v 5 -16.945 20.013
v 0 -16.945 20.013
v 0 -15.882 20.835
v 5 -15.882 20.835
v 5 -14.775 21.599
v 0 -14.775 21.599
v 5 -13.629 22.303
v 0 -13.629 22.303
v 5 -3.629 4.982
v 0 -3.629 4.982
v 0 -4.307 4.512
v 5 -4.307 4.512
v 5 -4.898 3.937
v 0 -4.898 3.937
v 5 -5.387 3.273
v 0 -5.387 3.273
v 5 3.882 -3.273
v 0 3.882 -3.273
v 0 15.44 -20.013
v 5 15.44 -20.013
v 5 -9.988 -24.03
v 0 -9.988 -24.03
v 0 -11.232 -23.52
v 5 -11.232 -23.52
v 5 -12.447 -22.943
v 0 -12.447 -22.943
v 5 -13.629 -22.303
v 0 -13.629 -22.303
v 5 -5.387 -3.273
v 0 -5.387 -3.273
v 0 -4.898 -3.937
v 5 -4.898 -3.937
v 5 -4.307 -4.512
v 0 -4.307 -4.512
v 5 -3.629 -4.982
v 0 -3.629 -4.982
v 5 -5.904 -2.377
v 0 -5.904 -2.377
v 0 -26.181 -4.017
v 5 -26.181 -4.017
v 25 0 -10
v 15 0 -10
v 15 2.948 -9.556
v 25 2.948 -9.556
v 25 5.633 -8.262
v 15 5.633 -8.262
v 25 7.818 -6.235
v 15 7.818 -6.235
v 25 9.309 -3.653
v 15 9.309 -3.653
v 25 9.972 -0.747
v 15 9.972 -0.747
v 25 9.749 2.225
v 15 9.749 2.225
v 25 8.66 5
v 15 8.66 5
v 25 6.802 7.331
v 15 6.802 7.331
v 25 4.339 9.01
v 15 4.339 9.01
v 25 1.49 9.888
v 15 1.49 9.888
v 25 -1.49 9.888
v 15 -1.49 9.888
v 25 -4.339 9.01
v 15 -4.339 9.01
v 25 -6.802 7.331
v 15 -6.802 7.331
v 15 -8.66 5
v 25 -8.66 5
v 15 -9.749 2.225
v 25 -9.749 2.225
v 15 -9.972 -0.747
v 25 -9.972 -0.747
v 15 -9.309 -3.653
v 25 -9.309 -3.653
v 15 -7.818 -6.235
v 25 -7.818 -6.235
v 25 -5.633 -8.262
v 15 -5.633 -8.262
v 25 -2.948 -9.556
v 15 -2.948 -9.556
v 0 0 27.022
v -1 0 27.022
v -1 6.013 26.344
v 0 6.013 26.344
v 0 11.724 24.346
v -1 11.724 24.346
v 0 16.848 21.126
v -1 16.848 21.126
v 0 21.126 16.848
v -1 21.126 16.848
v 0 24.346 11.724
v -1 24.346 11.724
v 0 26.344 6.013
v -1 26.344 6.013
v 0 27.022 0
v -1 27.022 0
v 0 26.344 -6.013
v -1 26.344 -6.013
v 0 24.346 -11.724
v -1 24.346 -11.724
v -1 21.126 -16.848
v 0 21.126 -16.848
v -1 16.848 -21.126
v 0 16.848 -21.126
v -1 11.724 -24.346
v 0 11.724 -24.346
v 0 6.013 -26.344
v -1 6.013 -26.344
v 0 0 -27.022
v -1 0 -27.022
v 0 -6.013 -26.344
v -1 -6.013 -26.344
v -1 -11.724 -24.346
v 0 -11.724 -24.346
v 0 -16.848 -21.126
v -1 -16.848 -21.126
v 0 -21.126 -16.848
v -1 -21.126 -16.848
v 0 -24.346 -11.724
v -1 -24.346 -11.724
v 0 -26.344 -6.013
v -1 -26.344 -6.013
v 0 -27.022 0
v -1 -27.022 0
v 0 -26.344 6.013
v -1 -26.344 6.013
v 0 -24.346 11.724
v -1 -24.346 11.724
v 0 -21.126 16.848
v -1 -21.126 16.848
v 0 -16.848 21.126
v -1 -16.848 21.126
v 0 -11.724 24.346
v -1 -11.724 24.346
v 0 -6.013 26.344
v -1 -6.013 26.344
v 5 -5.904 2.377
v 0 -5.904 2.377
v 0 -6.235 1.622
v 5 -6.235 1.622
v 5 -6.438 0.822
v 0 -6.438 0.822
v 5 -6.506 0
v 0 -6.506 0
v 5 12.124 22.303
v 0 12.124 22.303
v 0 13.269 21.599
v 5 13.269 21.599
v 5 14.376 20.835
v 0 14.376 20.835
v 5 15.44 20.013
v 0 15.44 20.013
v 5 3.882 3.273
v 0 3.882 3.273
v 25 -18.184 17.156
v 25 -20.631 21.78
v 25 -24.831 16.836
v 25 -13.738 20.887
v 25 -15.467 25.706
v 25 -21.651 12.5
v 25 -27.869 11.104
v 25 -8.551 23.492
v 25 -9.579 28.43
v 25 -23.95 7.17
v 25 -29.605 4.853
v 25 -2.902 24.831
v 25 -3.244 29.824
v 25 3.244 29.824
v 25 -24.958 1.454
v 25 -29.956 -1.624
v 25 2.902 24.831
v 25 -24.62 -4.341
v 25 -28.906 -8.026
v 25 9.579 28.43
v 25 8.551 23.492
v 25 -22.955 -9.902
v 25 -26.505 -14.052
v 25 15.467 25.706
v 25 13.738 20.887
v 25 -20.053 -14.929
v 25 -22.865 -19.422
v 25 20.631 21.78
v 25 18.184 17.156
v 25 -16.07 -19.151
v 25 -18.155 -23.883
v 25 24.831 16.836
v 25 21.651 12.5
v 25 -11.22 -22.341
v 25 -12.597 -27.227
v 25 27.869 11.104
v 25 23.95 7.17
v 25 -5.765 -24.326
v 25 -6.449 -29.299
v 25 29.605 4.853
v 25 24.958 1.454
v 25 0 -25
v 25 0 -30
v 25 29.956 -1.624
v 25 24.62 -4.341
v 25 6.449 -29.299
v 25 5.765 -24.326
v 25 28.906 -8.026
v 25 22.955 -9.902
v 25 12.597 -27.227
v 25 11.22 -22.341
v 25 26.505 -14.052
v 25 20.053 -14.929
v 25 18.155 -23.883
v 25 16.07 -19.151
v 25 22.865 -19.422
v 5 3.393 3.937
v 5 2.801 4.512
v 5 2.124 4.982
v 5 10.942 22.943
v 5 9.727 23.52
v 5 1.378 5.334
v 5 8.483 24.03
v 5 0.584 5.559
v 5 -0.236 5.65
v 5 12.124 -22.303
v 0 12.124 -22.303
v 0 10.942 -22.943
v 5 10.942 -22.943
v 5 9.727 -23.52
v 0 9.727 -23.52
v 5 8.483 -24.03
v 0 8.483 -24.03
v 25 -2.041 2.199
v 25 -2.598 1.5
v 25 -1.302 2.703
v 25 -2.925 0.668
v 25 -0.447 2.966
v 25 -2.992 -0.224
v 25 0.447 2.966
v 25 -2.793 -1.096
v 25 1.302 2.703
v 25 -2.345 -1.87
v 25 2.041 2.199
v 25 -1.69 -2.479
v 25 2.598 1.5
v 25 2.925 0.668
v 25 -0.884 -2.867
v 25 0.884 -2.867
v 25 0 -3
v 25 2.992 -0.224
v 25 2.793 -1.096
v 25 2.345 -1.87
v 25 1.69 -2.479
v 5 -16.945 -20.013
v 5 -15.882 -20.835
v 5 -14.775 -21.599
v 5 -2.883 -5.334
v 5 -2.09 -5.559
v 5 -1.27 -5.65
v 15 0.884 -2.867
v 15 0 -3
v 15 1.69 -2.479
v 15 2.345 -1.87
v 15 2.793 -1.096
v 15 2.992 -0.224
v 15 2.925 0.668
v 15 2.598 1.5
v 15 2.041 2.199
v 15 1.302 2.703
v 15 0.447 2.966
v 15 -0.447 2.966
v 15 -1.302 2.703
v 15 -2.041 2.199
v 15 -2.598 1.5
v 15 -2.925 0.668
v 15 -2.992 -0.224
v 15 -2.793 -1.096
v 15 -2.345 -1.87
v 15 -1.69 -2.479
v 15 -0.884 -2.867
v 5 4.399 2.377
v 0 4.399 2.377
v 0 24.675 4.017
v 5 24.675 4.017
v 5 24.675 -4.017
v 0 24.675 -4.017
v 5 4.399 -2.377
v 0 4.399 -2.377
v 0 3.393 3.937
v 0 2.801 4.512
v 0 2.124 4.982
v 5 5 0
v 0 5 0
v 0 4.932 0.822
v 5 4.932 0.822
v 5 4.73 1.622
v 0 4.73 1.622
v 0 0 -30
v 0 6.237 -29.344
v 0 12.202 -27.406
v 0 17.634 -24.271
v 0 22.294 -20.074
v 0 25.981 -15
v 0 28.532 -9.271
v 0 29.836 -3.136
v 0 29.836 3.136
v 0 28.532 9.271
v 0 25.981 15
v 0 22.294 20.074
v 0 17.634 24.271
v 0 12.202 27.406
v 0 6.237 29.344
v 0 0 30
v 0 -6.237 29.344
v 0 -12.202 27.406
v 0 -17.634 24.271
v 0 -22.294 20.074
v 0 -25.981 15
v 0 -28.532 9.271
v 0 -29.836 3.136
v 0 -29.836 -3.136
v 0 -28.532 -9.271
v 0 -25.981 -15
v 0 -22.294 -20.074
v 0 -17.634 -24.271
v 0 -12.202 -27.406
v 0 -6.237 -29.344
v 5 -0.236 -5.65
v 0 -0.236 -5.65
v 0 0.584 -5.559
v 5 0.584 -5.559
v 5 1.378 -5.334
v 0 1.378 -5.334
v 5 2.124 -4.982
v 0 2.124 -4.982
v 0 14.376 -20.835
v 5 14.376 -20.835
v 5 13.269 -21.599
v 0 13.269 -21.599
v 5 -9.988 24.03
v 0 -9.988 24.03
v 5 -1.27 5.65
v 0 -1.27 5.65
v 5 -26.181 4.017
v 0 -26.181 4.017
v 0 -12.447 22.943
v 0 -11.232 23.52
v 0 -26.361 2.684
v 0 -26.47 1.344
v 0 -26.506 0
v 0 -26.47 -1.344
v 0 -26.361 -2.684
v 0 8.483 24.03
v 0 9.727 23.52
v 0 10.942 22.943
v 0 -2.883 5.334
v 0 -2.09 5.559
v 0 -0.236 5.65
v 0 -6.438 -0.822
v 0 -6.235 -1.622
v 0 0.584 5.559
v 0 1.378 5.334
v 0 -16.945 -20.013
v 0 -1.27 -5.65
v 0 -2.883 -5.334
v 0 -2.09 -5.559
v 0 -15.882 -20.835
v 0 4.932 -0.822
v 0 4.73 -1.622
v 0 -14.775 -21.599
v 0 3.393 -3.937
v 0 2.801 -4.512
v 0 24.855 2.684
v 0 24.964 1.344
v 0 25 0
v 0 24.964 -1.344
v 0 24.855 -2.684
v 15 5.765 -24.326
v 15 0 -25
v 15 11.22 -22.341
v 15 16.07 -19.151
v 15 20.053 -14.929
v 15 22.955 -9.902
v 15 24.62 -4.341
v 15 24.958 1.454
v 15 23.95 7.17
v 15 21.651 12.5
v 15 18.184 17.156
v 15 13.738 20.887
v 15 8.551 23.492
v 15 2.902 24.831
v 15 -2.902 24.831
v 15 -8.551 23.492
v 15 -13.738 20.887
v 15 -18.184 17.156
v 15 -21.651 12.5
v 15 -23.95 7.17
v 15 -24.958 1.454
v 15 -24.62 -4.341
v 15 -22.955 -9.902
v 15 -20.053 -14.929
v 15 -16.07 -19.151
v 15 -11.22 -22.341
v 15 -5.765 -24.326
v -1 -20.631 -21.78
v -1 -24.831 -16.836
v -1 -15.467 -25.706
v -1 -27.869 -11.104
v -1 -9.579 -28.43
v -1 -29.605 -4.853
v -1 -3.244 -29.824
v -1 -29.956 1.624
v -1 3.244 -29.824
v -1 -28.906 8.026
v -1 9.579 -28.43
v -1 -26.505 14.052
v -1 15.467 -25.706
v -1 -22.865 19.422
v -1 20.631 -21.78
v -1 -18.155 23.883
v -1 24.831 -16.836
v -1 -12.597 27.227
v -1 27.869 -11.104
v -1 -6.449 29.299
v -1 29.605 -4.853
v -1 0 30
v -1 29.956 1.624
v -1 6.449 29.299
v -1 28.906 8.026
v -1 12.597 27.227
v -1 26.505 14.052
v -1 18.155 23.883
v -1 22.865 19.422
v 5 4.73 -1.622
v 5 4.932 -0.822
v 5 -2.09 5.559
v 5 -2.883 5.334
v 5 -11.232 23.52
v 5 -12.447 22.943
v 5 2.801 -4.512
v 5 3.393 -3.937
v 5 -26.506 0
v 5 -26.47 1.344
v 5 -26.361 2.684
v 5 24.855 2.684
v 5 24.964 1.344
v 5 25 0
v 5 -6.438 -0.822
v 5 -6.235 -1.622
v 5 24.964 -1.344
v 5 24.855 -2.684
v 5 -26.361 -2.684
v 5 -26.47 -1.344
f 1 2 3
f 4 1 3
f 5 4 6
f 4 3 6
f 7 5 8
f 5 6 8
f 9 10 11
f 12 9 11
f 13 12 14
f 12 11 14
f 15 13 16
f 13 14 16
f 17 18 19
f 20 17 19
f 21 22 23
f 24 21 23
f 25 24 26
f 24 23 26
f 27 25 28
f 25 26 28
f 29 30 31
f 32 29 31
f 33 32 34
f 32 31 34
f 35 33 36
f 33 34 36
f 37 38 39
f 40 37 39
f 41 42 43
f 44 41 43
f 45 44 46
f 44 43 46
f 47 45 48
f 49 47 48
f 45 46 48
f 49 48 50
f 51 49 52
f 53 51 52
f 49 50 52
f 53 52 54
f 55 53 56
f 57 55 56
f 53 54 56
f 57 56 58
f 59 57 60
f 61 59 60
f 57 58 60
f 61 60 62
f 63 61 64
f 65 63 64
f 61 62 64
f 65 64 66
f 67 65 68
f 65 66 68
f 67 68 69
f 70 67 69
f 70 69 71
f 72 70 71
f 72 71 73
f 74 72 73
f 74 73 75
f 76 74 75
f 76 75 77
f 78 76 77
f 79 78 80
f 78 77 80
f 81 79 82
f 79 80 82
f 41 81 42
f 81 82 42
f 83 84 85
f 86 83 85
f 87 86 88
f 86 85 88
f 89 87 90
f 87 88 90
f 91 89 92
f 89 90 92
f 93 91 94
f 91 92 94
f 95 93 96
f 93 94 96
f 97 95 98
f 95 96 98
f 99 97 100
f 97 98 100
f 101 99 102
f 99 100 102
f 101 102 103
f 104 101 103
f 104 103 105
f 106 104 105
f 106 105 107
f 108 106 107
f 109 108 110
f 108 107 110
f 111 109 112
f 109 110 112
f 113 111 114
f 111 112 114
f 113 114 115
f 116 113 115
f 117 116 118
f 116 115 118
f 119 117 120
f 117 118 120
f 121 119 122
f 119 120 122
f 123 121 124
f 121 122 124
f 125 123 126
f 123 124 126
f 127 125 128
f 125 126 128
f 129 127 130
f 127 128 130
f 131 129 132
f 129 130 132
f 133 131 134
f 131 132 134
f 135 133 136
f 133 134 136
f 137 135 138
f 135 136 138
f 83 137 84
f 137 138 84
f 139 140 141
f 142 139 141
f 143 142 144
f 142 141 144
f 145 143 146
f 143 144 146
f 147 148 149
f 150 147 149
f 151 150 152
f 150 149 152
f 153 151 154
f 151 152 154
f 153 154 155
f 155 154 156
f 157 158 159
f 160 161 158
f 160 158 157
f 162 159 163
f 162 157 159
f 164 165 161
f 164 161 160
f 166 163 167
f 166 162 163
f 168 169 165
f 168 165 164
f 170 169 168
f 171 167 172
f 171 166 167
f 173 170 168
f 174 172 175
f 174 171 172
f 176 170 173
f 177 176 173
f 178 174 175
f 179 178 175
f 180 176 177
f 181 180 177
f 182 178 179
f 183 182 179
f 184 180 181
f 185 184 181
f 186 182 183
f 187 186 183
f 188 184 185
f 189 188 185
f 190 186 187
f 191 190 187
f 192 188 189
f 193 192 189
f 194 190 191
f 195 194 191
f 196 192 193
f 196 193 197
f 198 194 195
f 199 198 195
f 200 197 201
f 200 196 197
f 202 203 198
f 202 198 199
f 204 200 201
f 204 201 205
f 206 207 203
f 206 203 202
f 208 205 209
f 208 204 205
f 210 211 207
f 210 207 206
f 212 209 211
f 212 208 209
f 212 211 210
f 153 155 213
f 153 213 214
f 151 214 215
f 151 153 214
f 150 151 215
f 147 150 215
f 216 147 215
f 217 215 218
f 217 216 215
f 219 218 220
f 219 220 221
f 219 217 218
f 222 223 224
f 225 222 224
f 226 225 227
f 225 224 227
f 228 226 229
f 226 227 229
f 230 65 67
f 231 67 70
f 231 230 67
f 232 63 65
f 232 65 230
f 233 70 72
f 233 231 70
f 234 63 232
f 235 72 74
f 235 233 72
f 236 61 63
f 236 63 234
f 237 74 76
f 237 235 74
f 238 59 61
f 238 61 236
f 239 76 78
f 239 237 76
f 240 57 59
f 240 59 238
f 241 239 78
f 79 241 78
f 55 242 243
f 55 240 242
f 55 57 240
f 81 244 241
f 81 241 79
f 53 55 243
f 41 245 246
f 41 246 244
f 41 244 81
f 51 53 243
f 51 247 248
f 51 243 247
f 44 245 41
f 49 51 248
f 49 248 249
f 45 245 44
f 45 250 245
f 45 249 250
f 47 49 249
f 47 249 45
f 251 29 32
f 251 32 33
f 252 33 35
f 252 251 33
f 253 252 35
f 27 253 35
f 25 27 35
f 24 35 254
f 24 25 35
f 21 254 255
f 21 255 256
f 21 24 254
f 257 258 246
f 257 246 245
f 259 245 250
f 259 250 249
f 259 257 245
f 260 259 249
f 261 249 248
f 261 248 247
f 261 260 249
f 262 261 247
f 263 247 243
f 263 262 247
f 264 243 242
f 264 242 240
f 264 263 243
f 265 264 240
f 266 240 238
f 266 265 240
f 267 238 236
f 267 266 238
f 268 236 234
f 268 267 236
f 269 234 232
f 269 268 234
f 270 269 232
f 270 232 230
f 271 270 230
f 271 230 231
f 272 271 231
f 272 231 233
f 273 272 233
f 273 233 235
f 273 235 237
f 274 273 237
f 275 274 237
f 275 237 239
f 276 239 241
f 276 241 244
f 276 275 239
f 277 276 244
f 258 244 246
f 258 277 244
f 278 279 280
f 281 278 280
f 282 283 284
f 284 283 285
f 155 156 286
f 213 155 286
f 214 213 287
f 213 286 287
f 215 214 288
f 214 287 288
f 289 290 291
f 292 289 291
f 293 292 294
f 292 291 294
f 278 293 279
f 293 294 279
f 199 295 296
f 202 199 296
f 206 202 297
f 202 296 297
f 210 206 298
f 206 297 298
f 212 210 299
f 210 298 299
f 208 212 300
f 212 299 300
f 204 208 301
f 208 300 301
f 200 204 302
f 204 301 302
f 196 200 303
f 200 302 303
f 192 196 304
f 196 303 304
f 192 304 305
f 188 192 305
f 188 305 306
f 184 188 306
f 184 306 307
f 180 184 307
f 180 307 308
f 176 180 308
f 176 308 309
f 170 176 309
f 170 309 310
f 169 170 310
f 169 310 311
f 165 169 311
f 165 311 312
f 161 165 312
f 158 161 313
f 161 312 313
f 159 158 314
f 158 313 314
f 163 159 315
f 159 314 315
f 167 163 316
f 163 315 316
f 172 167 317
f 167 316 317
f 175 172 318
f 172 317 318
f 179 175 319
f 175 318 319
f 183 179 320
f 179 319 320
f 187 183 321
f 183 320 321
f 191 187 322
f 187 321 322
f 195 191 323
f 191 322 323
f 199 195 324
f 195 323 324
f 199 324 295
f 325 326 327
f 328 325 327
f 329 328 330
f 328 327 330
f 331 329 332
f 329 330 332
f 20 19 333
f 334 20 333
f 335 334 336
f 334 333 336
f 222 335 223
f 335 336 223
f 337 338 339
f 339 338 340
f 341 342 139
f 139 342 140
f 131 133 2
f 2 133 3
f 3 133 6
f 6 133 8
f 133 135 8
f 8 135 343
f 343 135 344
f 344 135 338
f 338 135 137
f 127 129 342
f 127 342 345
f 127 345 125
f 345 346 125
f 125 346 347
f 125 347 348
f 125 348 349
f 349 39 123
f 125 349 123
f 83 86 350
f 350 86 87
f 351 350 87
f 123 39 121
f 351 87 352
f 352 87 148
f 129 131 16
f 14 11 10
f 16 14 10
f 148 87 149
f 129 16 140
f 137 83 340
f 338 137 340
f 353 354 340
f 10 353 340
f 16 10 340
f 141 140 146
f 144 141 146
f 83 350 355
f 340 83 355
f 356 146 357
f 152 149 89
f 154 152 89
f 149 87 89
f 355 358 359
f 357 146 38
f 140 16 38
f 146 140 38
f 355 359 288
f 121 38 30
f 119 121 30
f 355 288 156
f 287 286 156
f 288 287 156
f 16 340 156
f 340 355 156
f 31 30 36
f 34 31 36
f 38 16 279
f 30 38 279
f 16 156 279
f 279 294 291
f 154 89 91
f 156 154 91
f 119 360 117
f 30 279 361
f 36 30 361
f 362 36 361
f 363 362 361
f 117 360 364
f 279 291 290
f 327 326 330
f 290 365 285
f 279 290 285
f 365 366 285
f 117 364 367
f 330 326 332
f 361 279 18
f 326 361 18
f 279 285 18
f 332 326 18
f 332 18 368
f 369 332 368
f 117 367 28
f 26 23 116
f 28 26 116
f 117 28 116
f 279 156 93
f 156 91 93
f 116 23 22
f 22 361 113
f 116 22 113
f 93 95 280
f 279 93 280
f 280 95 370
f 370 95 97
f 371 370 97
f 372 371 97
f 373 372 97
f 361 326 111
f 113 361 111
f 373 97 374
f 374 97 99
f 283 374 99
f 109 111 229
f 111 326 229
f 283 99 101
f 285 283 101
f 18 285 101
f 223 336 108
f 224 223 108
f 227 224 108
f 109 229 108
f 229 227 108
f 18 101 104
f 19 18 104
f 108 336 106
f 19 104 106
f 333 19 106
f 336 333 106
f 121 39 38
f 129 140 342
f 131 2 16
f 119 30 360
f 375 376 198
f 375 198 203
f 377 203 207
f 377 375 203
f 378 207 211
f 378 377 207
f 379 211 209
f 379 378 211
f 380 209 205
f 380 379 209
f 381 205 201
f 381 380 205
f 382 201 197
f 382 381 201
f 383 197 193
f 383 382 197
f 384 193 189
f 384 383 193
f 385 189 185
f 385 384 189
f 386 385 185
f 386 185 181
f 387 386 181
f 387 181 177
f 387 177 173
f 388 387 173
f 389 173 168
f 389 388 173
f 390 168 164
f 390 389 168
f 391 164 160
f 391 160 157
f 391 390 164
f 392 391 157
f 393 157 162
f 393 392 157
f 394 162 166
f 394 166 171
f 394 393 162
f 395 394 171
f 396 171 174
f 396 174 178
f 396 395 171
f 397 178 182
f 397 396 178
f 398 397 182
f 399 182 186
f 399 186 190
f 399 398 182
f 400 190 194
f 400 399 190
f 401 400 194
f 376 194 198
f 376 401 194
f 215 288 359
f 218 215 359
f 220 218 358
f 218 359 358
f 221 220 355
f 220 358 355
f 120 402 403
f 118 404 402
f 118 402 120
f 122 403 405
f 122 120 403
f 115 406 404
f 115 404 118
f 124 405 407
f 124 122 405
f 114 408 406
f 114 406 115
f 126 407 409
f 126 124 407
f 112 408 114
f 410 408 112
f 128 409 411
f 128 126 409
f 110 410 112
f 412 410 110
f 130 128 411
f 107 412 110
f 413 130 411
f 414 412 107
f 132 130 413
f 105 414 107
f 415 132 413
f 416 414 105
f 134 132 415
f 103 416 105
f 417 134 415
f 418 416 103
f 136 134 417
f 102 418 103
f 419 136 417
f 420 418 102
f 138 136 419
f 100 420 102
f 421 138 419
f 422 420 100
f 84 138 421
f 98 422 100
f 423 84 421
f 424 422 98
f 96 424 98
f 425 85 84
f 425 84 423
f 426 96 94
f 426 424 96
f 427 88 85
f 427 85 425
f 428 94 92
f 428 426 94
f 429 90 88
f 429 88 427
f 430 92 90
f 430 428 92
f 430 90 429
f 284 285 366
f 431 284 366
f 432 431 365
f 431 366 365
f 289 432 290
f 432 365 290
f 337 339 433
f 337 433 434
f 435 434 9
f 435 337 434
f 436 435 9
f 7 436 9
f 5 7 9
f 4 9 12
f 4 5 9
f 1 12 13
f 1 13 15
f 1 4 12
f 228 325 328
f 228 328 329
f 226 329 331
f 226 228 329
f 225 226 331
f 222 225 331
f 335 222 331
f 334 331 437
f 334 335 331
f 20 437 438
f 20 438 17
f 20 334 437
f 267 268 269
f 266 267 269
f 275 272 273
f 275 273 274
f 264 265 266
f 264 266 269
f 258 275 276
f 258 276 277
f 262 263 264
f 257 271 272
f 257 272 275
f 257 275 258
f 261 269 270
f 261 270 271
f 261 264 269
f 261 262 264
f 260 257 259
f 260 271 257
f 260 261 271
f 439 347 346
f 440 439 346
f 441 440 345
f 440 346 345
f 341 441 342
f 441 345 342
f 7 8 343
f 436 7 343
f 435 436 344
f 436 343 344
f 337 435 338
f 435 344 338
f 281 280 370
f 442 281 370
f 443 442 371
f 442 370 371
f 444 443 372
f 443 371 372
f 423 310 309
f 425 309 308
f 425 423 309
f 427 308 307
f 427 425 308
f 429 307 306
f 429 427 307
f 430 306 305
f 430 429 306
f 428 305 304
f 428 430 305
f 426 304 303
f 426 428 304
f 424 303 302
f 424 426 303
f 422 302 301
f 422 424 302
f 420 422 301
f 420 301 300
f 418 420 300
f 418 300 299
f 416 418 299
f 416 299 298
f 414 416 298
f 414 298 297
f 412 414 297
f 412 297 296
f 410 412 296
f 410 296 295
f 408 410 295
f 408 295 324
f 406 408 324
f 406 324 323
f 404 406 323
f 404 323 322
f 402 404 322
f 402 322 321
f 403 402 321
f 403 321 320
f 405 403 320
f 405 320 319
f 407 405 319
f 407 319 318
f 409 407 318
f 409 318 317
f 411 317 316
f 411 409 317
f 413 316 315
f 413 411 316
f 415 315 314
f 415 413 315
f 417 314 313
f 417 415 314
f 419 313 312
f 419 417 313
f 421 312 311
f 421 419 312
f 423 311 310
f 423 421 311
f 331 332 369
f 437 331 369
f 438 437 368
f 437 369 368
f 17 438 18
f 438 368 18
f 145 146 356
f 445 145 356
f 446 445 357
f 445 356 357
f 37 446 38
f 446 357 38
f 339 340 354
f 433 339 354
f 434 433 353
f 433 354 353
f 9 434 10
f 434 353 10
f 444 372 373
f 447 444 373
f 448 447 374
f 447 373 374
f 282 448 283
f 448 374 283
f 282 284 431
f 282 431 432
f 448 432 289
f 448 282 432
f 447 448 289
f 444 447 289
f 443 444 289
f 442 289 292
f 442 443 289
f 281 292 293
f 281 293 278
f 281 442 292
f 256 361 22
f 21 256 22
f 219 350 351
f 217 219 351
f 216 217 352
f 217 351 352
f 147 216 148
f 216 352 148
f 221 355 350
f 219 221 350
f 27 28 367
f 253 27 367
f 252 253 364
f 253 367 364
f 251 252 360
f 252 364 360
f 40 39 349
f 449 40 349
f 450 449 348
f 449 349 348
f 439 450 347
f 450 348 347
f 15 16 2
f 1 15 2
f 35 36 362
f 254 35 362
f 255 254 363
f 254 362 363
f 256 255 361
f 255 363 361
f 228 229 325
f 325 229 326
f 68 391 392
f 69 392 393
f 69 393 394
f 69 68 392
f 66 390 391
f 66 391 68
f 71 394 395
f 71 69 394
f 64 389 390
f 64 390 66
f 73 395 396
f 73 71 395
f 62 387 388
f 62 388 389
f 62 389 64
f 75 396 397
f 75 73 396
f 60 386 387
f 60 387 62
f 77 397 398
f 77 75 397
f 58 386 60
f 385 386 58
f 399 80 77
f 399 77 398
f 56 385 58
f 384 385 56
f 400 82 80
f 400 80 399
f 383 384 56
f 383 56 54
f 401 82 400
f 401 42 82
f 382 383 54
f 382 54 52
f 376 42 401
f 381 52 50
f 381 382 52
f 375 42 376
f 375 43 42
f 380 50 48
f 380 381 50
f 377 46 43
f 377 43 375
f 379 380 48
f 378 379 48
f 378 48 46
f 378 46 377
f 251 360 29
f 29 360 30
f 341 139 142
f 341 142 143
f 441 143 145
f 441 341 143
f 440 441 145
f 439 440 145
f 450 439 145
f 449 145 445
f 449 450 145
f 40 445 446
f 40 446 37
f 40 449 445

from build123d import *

# Parameters (mm, degrees)
SKETCH1_R           = 30
BOSS_EXTRUDE1_DEPTH = 25
CUT_EXTRUDE1_DEPTH  = 5
CIRPATTERN1_COUNT   = 6
CUT_EXTRUDE2_START  = -10
SKETCH3_R           = 25
SKETCH3_R_2         = 10
SKETCH3_R_3         = 3
CUT_EXTRUDE2_DEPTH  = 10
BOSS_EXTRUDE2_START = 1
SKETCH4_R           = 30
SKETCH4_R_2         = 27.021684923
BOSS_EXTRUDE2_DEPTH = 1


with BuildPart() as part:
    # Sketch1 → Boss-Extrude1 (new body)
    with BuildSketch(Plane(origin=(0, 0, 0), x_dir=(0, 0, -1), z_dir=(1, 0, 0))):
        Circle(SKETCH1_R)
    extrude(amount=BOSS_EXTRUDE1_DEPTH)

    # Sketch2 → Cut-Extrude1 (cut)
    with BuildSketch(Plane.ZY):
        with BuildLine():
            Line((0, 25), (0, 5))
            ThreePointArc((0, 5), (1.225953008, 4.847374467), (2.377061324, 4.398815689))
            Line((2.377061324, 4.398815689), (4.016525549, 24.675241083))
            Line((4.016525549, 24.675241083), (0, 25))
        make_face()
        with BuildLine():
            ThreePointArc((-2.377061324, 4.398815689), (-1.225953008, 4.847374467), (0, 5))
            Line((0, 5), (0, 25))
            Line((0, 25), (-4.016525549, 24.675241083))
            Line((-4.016525549, 24.675241083), (-2.377061324, 4.398815689))
        make_face()
        with BuildLine():
            ThreePointArc((4.016525549, 24.675241083), (2.014816731, 24.918678005), (0, 25))
            Line((0, 25), (4.016525549, 24.675241083))
        make_face()
        with BuildLine():
            Line((-4.016525549, 24.675241083), (0, 25))
            ThreePointArc((0, 25), (-2.014816731, 24.918678005), (-4.016525549, 24.675241083))
        make_face()
    cut_extrude1 = extrude(amount=-CUT_EXTRUDE1_DEPTH, mode=Mode.SUBTRACT)

    # CirPattern1: Cut-Extrude1 ×6 about axis
    cirpattern1_axis = Axis((0, -0.752840444, 0), (1, 0, 0))
    for i in range(1, CIRPATTERN1_COUNT):
        add(cut_extrude1.rotate(cirpattern1_axis, i * 360 / CIRPATTERN1_COUNT), mode=Mode.SUBTRACT)

    # Sketch3 → Cut-Extrude2 (cut)
    # profile 1 of 2: a face of its own
    with BuildSketch(Plane(origin=(25, 0, 0), x_dir=(0, 0, -1), z_dir=(1, 0, 0)).offset(CUT_EXTRUDE2_START)):
        Circle(SKETCH3_R)
        Circle(SKETCH3_R_2, mode=Mode.SUBTRACT)
    # profile 2 of 2: a face of its own
    with BuildSketch(Plane(origin=(25, 0, 0), x_dir=(0, 0, -1), z_dir=(1, 0, 0)).offset(CUT_EXTRUDE2_START)):
        Circle(SKETCH3_R_3)
    extrude(amount=CUT_EXTRUDE2_DEPTH, mode=Mode.SUBTRACT)

    # Sketch4 → Boss-Extrude2 (add)
    with BuildSketch(Plane.ZY.offset(BOSS_EXTRUDE2_START)):
        Circle(SKETCH4_R)
        Circle(SKETCH4_R_2, mode=Mode.SUBTRACT)
    extrude(amount=-BOSS_EXTRUDE2_DEPTH)


solid = part.part
